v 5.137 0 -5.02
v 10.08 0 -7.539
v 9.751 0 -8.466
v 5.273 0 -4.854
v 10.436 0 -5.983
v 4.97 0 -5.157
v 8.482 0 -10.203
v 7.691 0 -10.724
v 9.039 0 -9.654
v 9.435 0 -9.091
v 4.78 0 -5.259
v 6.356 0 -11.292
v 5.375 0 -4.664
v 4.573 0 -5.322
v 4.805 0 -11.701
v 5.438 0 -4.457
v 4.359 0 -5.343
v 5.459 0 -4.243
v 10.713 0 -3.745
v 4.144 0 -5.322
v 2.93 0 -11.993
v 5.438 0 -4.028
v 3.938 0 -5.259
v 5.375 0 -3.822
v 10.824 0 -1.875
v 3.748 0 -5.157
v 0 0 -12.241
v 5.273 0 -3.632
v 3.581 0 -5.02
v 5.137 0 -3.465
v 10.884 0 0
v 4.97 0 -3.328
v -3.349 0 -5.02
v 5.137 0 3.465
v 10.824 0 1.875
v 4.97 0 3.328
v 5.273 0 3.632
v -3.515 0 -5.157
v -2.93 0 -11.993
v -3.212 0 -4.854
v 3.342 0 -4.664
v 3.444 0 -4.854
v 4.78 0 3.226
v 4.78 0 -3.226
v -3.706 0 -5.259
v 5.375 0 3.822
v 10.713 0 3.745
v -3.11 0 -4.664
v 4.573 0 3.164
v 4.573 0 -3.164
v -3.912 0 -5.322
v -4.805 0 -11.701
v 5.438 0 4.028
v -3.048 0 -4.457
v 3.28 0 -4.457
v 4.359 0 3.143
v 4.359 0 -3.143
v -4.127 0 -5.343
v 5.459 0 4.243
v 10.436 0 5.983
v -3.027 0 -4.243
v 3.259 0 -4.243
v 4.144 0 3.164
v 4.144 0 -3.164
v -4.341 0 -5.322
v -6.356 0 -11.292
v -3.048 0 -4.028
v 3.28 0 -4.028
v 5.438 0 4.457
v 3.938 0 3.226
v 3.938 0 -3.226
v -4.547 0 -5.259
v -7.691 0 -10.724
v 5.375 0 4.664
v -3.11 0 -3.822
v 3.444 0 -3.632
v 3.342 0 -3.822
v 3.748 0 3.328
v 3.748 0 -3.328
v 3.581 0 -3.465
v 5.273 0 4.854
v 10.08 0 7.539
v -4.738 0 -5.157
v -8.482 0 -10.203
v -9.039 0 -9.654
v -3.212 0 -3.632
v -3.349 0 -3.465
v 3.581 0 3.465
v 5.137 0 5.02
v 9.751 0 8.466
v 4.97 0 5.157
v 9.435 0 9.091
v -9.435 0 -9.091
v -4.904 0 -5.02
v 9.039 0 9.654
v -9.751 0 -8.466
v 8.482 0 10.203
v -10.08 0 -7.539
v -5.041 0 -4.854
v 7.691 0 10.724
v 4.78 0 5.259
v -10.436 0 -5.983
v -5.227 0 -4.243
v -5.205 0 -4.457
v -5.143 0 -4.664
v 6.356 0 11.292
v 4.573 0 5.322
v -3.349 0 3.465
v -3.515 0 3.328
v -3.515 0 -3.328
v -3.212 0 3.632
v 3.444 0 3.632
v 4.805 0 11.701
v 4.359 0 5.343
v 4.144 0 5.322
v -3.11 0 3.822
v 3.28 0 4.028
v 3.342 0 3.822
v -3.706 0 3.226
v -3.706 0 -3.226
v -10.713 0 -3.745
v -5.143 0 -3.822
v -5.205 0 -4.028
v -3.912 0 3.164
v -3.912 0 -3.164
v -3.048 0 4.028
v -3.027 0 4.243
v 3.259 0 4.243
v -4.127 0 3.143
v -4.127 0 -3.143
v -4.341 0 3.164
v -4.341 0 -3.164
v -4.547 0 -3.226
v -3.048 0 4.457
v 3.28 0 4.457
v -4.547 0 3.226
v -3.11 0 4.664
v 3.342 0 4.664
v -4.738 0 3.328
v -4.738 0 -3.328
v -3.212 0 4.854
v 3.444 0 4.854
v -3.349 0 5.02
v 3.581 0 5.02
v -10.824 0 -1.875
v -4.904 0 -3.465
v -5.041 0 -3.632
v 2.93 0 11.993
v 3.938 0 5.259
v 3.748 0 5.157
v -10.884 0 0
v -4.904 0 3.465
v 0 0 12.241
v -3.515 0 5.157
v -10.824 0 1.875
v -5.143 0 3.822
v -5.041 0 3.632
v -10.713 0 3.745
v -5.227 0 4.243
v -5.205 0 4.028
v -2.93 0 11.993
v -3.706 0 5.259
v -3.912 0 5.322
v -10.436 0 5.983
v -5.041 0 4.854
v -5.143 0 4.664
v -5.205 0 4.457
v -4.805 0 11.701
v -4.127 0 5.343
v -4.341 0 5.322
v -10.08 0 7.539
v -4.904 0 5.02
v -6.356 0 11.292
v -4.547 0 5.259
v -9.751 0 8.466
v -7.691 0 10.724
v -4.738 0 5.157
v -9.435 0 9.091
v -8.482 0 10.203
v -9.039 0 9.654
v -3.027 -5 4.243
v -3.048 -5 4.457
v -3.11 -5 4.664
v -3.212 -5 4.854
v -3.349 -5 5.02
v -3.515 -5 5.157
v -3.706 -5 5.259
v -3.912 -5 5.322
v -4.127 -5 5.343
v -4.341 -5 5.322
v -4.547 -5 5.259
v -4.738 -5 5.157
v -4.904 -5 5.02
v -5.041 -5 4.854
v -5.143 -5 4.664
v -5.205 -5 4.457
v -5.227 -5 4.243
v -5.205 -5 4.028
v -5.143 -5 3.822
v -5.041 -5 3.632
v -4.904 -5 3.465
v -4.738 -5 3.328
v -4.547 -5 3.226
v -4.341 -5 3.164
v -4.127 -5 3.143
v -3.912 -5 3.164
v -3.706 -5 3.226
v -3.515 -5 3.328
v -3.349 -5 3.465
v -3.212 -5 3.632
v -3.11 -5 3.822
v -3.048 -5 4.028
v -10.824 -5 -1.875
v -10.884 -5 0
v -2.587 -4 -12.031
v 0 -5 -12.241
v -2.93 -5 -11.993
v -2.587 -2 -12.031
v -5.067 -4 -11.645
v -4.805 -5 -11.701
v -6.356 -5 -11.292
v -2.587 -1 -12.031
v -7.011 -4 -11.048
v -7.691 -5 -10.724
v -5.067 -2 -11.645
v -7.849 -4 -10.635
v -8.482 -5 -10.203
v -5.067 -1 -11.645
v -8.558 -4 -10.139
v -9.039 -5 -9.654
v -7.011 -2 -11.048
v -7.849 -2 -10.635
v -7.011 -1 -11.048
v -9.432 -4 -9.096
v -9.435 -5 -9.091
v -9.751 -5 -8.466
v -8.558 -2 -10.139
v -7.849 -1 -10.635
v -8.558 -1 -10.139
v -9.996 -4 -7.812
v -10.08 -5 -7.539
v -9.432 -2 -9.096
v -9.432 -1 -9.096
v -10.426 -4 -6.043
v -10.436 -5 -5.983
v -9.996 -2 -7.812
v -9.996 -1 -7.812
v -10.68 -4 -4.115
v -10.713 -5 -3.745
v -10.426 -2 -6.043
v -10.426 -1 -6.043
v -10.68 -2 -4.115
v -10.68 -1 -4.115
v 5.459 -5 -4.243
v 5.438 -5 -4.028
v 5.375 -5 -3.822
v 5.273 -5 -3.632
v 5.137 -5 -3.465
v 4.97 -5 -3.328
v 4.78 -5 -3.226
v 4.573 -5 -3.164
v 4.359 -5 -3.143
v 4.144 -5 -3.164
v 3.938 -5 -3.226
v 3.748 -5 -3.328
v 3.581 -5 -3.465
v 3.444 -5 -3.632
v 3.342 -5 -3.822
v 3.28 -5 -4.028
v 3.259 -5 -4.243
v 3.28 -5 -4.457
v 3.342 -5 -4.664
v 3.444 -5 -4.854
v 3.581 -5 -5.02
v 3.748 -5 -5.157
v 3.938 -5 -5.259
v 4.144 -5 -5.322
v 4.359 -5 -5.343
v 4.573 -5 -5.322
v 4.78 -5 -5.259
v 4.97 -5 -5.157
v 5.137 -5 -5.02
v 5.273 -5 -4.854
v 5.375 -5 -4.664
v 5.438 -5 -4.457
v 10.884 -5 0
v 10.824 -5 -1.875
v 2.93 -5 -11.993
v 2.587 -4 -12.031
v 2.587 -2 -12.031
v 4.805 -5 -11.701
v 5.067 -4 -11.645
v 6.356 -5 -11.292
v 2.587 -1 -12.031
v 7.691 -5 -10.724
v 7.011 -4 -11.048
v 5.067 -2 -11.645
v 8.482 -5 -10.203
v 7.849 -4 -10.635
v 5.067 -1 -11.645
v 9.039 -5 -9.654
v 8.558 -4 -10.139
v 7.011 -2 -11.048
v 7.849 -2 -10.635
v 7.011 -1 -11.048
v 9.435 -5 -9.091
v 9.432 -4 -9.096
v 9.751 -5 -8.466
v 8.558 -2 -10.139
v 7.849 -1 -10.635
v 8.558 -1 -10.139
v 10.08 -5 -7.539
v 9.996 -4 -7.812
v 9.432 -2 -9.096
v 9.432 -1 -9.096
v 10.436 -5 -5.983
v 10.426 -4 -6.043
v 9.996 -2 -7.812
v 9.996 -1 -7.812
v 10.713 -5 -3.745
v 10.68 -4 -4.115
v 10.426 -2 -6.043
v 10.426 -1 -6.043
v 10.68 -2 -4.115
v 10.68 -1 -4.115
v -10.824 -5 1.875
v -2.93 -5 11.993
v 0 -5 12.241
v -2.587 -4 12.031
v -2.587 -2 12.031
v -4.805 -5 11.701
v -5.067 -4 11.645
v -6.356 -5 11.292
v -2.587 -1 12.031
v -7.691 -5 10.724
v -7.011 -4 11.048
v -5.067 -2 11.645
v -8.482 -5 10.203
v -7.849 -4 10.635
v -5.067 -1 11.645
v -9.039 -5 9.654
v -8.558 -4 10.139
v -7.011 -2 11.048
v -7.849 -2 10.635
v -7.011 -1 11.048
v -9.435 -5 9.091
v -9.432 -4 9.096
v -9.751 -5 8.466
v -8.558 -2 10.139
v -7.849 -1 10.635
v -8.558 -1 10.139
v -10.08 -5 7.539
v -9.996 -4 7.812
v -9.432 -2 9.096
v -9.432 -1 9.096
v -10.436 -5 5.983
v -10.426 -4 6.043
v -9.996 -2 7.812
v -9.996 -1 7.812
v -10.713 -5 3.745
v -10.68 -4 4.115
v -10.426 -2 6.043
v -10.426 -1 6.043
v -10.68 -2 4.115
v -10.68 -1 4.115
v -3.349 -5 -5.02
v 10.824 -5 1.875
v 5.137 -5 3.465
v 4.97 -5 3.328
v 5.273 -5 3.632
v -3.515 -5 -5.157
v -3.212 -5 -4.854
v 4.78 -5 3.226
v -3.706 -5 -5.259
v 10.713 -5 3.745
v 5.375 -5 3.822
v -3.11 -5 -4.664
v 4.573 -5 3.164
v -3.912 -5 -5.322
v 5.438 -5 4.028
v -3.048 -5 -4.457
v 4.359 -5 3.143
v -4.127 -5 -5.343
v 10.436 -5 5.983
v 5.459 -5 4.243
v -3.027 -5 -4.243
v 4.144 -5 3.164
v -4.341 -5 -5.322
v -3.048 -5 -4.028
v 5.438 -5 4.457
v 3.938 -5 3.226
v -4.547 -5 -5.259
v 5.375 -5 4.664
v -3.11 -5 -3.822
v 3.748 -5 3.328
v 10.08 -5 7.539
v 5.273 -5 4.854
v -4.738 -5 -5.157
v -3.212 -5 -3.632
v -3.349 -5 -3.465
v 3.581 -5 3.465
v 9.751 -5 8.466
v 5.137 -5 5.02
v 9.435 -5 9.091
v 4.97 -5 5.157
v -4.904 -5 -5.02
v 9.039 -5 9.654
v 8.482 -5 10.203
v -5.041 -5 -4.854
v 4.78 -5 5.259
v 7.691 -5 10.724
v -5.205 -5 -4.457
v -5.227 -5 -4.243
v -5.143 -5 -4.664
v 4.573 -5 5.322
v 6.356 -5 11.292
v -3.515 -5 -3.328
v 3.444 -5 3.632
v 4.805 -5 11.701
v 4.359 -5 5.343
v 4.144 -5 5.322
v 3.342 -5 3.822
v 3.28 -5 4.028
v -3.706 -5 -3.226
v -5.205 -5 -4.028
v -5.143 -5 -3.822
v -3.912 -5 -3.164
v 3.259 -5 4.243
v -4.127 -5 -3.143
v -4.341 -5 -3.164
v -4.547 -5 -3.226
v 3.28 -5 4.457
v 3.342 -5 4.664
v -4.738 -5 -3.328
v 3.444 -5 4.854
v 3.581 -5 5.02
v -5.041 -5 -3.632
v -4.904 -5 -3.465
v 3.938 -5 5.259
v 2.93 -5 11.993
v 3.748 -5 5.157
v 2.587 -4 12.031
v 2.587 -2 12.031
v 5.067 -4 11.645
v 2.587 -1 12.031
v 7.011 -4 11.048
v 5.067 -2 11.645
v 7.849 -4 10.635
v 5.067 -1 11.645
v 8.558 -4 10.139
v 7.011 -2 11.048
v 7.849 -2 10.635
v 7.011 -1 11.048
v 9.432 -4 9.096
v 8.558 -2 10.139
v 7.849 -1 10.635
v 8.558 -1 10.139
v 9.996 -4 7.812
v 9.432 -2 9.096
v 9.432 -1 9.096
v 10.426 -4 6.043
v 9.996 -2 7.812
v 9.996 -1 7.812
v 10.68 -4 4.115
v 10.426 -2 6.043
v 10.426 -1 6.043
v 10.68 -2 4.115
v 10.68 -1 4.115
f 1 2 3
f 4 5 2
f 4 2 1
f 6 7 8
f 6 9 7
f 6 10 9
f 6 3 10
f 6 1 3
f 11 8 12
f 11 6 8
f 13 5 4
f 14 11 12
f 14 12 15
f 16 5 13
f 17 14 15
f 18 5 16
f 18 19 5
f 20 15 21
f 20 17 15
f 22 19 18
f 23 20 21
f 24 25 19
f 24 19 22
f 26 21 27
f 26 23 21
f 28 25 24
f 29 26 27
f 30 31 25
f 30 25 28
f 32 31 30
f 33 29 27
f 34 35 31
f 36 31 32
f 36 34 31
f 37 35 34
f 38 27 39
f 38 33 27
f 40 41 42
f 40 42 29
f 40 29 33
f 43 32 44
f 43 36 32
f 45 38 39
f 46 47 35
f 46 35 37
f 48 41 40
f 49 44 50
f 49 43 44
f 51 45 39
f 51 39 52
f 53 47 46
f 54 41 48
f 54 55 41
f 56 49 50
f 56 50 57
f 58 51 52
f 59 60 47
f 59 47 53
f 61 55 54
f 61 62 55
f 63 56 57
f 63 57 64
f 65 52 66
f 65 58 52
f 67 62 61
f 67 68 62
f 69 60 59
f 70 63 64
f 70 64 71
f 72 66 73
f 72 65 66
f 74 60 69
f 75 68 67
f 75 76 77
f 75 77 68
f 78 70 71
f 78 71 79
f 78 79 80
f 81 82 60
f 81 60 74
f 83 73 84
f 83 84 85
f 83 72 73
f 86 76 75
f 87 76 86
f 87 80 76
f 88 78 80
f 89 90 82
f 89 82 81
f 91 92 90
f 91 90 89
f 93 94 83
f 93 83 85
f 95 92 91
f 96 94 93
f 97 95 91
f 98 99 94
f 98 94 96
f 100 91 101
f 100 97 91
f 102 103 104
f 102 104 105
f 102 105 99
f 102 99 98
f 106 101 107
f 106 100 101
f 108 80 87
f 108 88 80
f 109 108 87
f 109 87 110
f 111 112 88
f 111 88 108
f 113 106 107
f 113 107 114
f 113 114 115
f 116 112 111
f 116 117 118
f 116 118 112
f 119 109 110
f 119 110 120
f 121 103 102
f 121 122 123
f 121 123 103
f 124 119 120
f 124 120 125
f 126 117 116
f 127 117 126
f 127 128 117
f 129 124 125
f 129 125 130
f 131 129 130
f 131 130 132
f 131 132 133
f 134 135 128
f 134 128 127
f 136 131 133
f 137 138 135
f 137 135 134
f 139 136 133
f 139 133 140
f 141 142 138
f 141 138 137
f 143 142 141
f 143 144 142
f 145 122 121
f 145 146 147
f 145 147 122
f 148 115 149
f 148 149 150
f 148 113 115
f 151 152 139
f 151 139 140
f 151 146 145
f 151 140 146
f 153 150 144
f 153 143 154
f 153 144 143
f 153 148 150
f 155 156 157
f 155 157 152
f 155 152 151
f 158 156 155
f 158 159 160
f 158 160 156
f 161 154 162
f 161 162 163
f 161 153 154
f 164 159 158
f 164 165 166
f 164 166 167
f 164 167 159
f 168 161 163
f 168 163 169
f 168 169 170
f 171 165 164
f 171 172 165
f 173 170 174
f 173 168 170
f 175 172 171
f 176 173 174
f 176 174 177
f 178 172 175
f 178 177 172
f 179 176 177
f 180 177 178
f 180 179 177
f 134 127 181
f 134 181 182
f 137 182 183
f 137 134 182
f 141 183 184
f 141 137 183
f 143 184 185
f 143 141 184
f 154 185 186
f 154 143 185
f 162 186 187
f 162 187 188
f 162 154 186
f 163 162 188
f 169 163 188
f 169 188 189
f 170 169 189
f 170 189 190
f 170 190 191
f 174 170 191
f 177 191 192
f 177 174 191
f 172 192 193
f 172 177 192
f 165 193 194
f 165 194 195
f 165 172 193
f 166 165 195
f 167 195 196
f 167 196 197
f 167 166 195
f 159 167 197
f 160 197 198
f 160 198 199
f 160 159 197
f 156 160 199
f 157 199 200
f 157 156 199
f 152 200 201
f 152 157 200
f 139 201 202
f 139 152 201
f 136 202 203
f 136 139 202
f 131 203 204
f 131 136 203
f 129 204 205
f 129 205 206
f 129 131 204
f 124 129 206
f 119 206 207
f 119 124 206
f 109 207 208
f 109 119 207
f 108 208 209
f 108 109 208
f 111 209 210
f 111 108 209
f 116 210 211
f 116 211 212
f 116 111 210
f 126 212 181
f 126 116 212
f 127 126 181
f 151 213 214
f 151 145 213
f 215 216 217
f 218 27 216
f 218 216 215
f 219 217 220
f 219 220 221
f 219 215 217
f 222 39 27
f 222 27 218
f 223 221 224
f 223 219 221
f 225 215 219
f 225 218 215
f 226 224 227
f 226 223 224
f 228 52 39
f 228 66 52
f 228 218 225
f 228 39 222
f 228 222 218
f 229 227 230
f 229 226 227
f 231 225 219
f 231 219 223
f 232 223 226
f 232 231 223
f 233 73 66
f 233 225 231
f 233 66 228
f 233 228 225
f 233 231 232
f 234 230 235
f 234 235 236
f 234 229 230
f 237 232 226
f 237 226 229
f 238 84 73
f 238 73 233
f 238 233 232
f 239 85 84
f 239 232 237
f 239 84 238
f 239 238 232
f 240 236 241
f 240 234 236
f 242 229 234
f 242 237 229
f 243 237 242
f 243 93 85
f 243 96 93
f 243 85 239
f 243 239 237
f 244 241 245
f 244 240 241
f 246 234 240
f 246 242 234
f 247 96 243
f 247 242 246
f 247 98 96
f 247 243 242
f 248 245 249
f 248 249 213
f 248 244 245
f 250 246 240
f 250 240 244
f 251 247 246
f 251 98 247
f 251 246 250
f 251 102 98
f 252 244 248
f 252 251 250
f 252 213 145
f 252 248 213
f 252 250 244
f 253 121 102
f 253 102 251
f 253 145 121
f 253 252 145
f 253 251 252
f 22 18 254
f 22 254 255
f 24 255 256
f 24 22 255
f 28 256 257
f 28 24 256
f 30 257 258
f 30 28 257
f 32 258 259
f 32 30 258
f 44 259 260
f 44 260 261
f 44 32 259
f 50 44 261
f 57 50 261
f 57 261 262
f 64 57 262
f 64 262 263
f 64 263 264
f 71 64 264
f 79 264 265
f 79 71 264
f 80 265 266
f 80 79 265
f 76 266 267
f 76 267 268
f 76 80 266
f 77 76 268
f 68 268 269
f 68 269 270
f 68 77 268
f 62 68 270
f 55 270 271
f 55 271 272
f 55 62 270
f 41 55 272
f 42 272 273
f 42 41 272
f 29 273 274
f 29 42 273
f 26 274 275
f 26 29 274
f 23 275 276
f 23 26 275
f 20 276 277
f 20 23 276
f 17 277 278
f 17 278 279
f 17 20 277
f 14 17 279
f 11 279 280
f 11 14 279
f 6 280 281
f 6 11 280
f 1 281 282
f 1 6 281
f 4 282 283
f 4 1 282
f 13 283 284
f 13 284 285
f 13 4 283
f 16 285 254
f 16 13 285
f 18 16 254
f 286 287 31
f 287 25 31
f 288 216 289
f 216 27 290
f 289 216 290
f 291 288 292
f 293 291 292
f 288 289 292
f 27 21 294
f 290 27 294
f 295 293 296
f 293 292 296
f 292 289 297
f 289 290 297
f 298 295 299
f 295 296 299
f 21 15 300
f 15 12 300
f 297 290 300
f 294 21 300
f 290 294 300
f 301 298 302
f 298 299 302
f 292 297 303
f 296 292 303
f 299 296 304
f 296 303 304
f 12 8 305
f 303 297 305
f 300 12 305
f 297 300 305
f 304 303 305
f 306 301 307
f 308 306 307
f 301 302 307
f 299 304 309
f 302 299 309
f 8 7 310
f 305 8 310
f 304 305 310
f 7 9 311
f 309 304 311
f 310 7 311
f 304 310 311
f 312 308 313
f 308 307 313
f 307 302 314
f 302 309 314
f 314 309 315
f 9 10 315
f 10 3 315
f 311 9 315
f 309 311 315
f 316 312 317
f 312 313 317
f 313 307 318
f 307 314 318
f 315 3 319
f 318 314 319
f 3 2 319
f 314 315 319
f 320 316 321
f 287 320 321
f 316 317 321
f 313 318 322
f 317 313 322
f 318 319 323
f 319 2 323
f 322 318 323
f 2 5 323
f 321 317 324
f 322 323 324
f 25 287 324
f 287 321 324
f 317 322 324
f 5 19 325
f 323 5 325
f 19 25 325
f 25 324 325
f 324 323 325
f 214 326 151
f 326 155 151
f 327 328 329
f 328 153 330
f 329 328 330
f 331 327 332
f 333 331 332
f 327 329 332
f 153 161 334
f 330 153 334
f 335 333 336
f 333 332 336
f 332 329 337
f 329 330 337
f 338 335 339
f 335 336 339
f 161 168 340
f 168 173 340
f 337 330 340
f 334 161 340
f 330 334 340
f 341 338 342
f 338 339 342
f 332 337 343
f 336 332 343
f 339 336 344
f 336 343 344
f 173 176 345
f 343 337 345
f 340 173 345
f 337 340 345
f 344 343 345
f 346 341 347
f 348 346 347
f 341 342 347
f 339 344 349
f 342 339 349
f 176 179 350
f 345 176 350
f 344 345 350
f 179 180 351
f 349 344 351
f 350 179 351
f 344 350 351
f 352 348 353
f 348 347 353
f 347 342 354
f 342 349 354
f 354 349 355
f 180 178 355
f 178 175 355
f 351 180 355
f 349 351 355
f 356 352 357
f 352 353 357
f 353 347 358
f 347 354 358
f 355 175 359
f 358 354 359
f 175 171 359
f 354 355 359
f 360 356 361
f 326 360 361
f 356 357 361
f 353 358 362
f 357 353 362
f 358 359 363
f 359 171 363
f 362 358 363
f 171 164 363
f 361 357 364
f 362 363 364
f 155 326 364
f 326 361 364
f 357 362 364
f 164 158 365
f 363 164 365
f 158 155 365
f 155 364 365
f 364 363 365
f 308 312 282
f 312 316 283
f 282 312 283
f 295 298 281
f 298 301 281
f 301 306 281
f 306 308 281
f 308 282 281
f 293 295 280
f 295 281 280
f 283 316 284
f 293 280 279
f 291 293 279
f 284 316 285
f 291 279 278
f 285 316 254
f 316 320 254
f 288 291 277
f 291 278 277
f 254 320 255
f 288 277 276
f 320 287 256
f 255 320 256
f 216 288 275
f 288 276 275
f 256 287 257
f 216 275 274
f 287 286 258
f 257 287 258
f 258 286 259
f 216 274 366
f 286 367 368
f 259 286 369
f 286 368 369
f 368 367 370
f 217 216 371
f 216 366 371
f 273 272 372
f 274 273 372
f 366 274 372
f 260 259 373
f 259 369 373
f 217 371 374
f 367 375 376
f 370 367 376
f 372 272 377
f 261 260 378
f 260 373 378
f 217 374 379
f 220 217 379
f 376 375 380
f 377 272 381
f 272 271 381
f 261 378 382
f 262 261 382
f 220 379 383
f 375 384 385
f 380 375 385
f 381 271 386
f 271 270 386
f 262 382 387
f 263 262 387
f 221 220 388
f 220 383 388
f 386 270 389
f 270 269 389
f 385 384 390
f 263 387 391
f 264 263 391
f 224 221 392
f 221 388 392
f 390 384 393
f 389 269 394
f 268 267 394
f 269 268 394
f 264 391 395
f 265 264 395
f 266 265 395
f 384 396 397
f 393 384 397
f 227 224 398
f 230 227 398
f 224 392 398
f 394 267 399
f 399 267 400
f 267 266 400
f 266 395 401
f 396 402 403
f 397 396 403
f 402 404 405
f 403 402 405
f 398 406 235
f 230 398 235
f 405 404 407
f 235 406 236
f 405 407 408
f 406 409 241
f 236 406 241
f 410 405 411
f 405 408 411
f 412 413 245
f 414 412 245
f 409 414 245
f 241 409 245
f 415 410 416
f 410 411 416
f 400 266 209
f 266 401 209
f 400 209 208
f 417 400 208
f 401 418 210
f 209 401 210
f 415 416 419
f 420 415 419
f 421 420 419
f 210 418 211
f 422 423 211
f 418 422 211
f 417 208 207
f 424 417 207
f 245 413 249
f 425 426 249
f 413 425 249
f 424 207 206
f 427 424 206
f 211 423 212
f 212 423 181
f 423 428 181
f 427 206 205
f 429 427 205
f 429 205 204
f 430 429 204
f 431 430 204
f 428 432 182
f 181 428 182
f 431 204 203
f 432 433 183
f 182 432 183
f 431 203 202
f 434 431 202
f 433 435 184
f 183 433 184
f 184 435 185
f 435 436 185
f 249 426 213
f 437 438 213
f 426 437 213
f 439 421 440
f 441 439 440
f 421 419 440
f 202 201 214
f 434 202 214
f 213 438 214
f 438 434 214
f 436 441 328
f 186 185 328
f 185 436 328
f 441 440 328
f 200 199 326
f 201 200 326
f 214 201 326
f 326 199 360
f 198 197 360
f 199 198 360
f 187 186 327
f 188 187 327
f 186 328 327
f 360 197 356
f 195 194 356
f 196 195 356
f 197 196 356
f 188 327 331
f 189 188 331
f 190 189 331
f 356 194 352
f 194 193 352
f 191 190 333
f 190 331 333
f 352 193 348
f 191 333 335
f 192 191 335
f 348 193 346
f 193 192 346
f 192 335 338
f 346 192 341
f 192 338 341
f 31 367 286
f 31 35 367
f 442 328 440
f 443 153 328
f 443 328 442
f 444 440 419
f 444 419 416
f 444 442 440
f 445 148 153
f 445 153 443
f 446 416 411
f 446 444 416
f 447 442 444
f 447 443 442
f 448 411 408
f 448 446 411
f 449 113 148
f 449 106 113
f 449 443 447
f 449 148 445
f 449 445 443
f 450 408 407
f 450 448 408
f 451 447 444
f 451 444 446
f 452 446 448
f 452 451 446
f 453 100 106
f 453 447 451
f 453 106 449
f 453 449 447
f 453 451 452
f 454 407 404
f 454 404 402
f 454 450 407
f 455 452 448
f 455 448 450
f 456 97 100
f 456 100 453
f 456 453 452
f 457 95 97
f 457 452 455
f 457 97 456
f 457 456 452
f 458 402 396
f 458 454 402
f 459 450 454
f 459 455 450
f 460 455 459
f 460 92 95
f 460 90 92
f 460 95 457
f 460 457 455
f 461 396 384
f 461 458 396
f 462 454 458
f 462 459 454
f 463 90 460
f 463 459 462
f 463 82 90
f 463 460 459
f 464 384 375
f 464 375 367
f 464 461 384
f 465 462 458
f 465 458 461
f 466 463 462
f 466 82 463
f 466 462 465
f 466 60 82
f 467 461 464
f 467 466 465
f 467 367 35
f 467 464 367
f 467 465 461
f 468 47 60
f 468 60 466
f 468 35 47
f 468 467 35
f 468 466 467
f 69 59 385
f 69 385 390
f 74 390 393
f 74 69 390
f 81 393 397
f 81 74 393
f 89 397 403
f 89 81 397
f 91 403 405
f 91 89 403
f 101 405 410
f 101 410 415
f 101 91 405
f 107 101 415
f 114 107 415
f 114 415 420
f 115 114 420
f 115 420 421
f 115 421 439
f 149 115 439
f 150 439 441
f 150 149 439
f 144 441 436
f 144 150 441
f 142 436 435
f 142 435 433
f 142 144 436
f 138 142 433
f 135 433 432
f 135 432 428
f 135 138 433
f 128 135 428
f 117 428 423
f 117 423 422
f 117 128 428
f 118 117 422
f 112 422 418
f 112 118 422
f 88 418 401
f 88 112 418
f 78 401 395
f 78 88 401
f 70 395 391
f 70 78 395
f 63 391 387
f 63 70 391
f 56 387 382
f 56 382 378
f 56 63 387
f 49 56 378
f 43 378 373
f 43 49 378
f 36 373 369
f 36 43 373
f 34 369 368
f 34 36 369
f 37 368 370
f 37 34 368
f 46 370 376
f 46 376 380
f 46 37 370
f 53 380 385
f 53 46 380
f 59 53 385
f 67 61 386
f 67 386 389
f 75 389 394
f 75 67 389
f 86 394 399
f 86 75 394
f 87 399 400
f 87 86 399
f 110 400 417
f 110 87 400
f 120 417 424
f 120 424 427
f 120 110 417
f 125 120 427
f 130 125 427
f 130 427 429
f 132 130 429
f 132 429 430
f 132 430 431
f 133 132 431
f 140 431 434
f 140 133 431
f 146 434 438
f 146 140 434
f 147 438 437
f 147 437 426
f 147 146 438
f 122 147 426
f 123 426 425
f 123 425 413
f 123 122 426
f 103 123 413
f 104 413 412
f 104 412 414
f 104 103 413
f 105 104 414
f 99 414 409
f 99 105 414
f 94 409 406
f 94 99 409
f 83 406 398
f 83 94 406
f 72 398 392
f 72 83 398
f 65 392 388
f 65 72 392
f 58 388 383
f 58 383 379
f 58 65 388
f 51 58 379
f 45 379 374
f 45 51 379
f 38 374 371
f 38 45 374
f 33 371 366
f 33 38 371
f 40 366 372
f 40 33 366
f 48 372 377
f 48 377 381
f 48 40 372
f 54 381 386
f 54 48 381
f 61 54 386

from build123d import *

# Parameters (mm, degrees)
F0_R     = 1.1
F1_DEPTH = 5


with BuildPart() as f1:
    # F0 (on Front) → F1 (new body)
    with BuildSketch(Plane.XZ):
        with BuildLine():
            add(Edge.make_bspline(
                [(0, 12.241055), (1.7366674499, 12.1203561255), (4.9726378782, 11.8954552737), (8.7874652288, 10.4524618321), (10.1775930633, 7.8255389255), (10.7726161671, 4.0613675301), (10.8462352756, 1.3742818944), (10.883887, 0)],
                knots=[0, 0, 0, 0, 0.22974122, 0.4280818381, 0.5963198284, 0.7935419908, 1, 1, 1, 1], degree=3))
            add(Edge.make_bspline(
                [(0, 12.241055), (-1.7366674499, 12.1203561255), (-4.9726378782, 11.8954552737), (-8.7874652288, 10.4524618321), (-10.1775930633, 7.8255389255), (-10.7726161671, 4.0613675301), (-10.8462352756, 1.3742818944), (-10.883887, 0)],
                knots=[0, 0, 0, 0, 0.22974122, 0.4280818381, 0.5963198284, 0.7935419908, 1, 1, 1, 1], degree=3))
            add(Edge.make_bspline(
                [(0, -12.241055), (-1.7366674499, -12.1203561255), (-4.9726378782, -11.8954552737), (-8.7874652288, -10.4524618321), (-10.1775930633, -7.8255389255), (-10.7726161671, -4.0613675301), (-10.8462352756, -1.3742818944), (-10.883887, 0)],
                knots=[0, 0, 0, 0, 0.22974122, 0.4280818381, 0.5963198284, 0.7935419908, 1, 1, 1, 1], degree=3))
            add(Edge.make_bspline(
                [(0, -12.241055), (1.7366674499, -12.1203561255), (4.9726378782, -11.8954552737), (8.7874652288, -10.4524618321), (10.1775930633, -7.8255389255), (10.7726161671, -4.0613675301), (10.8462352756, -1.3742818944), (10.883887, 0)],
                knots=[0, 0, 0, 0, 0.22974122, 0.4280818381, 0.5963198284, 0.7935419908, 1, 1, 1, 1], degree=3))
        make_face()
        with Locations((-4.126528, -4.242641)):
            Circle(F0_R, mode=Mode.SUBTRACT)
        with Locations((4.358754, -4.242641)):
            Circle(F0_R, mode=Mode.SUBTRACT)
        with Locations((-4.126528, 4.242641)):
            Circle(F0_R, mode=Mode.SUBTRACT)
        with Locations((4.358754, 4.242641)):
            Circle(F0_R, mode=Mode.SUBTRACT)
    extrude(amount=F1_DEPTH)


solid = f1.part
